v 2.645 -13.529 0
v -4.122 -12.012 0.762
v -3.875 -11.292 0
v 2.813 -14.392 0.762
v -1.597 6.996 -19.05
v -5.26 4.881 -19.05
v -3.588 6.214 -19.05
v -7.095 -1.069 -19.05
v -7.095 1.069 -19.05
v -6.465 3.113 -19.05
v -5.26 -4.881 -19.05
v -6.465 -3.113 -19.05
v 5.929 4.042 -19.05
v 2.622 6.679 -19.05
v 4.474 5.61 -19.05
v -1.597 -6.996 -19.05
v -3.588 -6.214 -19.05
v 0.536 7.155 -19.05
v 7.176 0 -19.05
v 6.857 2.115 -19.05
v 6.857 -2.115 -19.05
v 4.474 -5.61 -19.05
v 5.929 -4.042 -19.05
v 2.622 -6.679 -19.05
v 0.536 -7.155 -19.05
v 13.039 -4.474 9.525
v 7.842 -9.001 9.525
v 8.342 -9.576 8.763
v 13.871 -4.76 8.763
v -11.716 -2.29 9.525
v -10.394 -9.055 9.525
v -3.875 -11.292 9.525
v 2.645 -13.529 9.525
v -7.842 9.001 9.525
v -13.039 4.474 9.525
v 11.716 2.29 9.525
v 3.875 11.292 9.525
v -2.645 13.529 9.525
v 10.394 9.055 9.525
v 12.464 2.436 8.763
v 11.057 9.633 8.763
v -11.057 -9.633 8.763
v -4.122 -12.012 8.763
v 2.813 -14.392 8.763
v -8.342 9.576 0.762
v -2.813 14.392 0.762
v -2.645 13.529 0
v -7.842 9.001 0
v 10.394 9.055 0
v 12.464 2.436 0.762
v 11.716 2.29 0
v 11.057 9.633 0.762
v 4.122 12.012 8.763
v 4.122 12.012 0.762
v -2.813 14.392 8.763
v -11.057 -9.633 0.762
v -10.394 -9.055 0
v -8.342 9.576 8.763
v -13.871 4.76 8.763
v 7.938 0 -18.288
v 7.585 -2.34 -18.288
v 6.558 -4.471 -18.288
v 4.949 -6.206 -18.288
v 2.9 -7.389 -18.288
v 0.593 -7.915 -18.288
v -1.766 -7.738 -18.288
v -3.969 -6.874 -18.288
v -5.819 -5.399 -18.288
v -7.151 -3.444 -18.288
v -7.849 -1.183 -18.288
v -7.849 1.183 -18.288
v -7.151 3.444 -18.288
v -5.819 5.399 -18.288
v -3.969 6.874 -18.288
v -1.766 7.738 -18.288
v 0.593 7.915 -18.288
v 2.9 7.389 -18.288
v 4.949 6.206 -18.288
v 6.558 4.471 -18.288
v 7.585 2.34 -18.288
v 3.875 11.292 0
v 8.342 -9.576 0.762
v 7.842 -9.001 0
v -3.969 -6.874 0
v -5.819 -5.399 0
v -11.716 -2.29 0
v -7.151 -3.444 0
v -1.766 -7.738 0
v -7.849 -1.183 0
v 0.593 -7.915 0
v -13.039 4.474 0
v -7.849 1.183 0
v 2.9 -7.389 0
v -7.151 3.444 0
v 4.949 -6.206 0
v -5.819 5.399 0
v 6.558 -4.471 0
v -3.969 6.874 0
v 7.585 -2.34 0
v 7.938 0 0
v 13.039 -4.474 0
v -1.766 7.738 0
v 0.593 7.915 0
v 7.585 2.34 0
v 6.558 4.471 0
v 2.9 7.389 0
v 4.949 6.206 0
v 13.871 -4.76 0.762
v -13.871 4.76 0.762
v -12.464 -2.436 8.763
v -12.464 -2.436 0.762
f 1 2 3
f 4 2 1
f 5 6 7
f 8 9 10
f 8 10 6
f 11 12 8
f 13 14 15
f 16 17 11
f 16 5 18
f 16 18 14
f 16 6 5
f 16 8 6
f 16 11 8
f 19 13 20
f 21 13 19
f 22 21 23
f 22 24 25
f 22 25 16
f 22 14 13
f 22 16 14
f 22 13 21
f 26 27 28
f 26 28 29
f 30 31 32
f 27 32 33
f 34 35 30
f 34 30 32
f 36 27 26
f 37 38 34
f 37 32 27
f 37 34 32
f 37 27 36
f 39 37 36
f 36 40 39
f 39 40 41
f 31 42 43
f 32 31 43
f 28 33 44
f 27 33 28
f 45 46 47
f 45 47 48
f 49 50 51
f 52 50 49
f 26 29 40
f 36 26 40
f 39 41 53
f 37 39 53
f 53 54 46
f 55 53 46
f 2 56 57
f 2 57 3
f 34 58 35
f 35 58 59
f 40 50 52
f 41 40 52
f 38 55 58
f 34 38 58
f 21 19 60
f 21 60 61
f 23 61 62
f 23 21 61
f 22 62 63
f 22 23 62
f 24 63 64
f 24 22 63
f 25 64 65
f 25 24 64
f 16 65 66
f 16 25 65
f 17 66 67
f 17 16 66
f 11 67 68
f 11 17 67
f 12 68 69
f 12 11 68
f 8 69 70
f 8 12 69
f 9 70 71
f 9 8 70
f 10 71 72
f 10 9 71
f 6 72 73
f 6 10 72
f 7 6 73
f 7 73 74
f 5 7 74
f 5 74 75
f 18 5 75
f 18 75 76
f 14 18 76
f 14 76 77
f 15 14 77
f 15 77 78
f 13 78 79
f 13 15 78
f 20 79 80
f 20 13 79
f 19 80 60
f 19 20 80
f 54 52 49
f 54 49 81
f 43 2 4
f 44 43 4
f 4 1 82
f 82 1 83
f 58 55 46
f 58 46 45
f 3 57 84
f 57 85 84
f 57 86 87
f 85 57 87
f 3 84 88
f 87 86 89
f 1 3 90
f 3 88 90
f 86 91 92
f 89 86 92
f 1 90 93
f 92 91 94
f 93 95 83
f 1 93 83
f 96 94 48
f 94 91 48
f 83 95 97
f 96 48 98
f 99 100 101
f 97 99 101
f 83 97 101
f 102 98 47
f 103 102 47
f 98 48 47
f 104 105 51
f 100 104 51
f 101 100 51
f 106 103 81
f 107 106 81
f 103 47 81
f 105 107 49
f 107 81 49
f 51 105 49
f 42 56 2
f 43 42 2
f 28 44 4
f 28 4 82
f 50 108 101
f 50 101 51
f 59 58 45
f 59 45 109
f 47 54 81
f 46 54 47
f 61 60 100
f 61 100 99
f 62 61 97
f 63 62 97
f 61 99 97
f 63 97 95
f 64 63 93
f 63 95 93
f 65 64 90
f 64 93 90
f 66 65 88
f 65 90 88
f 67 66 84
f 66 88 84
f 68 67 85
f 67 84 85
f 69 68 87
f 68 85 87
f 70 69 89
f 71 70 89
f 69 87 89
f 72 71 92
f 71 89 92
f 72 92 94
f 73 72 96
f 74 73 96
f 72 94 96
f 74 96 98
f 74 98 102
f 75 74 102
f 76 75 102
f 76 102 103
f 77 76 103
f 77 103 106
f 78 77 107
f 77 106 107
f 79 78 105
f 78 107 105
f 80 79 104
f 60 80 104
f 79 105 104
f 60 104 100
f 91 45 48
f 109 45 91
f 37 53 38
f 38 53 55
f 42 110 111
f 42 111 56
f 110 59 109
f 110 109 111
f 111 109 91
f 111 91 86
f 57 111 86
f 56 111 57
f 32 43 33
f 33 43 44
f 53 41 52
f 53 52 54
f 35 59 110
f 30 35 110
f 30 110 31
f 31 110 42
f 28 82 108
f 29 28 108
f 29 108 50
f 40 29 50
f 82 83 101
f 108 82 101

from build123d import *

# Parameters (mm, degrees)
F1_DEPTH = 9.525
F2_R     = 7.9375
F3_DEPTH = 19.05
F4_SIZE2 = 0.762
F4_SIZE  = 0.762


with BuildPart() as f1:
    # F0 (on Top) → F1 (new body)
    with BuildSketch(Plane.XY):
        with BuildLine():
            ThreePointArc((12.4640951626, 2.4364588605), (12.6408862143, 1.2239263531), (12.7, 0))
            ThreePointArc((12.7, 0), (11.559292099, -5.2604910579), (8.3420840677, -9.5759925547))
            Line((8.3420840677, -9.5759925547), (13.8707859253, -4.7596881355))
            Line((13.8707859253, -4.7596881355), (12.4640951626, 2.4364588605))
        make_face()
        with BuildLine():
            Line((2.8133821232, -14.3922970495), (8.3420840677, -9.5759925547))
            ThreePointArc((8.3420840677, -9.5759925547), (2.4364604633, -12.4640948492), (-4.1220107511, -12.0124530121))
            Line((-4.1220107511, -12.0124530121), (2.8133821232, -14.3922970495))
        make_face()
        with BuildLine():
            ThreePointArc((4.1220108652, 12.0124529729), (9.5759931131, 8.3420834267), (12.4640951626, 2.4364588605))
            Line((12.4640951626, 2.4364588605), (11.0574038021, 9.632608914))
            Line((11.0574038021, 9.632608914), (4.1220108652, 12.0124529729))
        make_face()
        with BuildLine():
            ThreePointArc((-12.4640951419, -2.4364589661), (-12.0124527553, 4.1220114996), (-8.3420840651, 9.5759925569))
            Line((-8.3420840651, 9.5759925569), (-13.8707859253, 4.7596881355))
            Line((-13.8707859253, 4.7596881355), (-12.4640951419, -2.4364589661))
        make_face()
        with BuildLine():
            Line((-11.0574038021, -9.632608914), (-4.1220107511, -12.0124530121))
            ThreePointArc((-4.1220107511, -12.0124530121), (-9.5759930381, -8.3420835128), (-12.4640951419, -2.4364589661))
            Line((-12.4640951419, -2.4364589661), (-11.0574038021, -9.632608914))
        make_face()
        with BuildLine():
            ThreePointArc((-8.3420840651, 9.5759925569), (-2.4364604025, 12.4640948611), (4.1220108652, 12.0124529729))
            Line((4.1220108652, 12.0124529729), (-2.8133821232, 14.3922970495))
            Line((-2.8133821232, 14.3922970495), (-8.3420840651, 9.5759925569))
        make_face()
        with BuildLine():
            ThreePointArc((8.3420840677, -9.5759925547), (11.559292099, -5.2604910579), (12.7, 0))
            ThreePointArc((12.7, 0), (12.6408862143, 1.2239263531), (12.4640951626, 2.4364588605))
            ThreePointArc((12.4640951626, 2.4364588605), (9.5759931131, 8.3420834267), (4.1220108652, 12.0124529729))
            ThreePointArc((4.1220108652, 12.0124529729), (-2.4364604025, 12.4640948611), (-8.3420840651, 9.5759925569))
            ThreePointArc((-8.3420840651, 9.5759925569), (-12.0124527553, 4.1220114996), (-12.4640951419, -2.4364589661))
            ThreePointArc((-12.4640951419, -2.4364589661), (-9.5759930381, -8.3420835128), (-4.1220107511, -12.0124530121))
            ThreePointArc((-4.1220107511, -12.0124530121), (2.4364604633, -12.4640948492), (8.3420840677, -9.5759925547))
        make_face()
    extrude(amount=F1_DEPTH)

    # F2 (on face) → F3 (join)
    with BuildSketch(Plane(origin=(0, 0, 0), x_dir=(1, 0, 0), z_dir=(0, 0, -1))):
        Circle(F2_R)
    extrude(amount=F3_DEPTH)

    # F4
    f4_edges = [f1.edges().sort_by_distance(p)[0] for p in [
        (4.122011, 12.012453, 9.525),
        (12.464095, 2.43646, 9.525),
        (8.342084, -9.575993, 9.525),
        (-12.464095, -2.43646, 9.525),
        (-4.122011, -12.012453, 9.525),
        (-8.342084, 9.575993, 9.525),
        (-7.9375, 0, -19.05),
        (8.342084, -9.575993, 0),
        (12.464095, 2.43646, 0),
        (4.122011, 12.012453, 0),
        (-8.342084, 9.575993, 0),
        (-12.464095, -2.43646, 0),
        (-4.122011, -12.012453, 0),
    ]]
    chamfer(f4_edges, length=F4_SIZE, length2=F4_SIZE2)


solid = f1.part
